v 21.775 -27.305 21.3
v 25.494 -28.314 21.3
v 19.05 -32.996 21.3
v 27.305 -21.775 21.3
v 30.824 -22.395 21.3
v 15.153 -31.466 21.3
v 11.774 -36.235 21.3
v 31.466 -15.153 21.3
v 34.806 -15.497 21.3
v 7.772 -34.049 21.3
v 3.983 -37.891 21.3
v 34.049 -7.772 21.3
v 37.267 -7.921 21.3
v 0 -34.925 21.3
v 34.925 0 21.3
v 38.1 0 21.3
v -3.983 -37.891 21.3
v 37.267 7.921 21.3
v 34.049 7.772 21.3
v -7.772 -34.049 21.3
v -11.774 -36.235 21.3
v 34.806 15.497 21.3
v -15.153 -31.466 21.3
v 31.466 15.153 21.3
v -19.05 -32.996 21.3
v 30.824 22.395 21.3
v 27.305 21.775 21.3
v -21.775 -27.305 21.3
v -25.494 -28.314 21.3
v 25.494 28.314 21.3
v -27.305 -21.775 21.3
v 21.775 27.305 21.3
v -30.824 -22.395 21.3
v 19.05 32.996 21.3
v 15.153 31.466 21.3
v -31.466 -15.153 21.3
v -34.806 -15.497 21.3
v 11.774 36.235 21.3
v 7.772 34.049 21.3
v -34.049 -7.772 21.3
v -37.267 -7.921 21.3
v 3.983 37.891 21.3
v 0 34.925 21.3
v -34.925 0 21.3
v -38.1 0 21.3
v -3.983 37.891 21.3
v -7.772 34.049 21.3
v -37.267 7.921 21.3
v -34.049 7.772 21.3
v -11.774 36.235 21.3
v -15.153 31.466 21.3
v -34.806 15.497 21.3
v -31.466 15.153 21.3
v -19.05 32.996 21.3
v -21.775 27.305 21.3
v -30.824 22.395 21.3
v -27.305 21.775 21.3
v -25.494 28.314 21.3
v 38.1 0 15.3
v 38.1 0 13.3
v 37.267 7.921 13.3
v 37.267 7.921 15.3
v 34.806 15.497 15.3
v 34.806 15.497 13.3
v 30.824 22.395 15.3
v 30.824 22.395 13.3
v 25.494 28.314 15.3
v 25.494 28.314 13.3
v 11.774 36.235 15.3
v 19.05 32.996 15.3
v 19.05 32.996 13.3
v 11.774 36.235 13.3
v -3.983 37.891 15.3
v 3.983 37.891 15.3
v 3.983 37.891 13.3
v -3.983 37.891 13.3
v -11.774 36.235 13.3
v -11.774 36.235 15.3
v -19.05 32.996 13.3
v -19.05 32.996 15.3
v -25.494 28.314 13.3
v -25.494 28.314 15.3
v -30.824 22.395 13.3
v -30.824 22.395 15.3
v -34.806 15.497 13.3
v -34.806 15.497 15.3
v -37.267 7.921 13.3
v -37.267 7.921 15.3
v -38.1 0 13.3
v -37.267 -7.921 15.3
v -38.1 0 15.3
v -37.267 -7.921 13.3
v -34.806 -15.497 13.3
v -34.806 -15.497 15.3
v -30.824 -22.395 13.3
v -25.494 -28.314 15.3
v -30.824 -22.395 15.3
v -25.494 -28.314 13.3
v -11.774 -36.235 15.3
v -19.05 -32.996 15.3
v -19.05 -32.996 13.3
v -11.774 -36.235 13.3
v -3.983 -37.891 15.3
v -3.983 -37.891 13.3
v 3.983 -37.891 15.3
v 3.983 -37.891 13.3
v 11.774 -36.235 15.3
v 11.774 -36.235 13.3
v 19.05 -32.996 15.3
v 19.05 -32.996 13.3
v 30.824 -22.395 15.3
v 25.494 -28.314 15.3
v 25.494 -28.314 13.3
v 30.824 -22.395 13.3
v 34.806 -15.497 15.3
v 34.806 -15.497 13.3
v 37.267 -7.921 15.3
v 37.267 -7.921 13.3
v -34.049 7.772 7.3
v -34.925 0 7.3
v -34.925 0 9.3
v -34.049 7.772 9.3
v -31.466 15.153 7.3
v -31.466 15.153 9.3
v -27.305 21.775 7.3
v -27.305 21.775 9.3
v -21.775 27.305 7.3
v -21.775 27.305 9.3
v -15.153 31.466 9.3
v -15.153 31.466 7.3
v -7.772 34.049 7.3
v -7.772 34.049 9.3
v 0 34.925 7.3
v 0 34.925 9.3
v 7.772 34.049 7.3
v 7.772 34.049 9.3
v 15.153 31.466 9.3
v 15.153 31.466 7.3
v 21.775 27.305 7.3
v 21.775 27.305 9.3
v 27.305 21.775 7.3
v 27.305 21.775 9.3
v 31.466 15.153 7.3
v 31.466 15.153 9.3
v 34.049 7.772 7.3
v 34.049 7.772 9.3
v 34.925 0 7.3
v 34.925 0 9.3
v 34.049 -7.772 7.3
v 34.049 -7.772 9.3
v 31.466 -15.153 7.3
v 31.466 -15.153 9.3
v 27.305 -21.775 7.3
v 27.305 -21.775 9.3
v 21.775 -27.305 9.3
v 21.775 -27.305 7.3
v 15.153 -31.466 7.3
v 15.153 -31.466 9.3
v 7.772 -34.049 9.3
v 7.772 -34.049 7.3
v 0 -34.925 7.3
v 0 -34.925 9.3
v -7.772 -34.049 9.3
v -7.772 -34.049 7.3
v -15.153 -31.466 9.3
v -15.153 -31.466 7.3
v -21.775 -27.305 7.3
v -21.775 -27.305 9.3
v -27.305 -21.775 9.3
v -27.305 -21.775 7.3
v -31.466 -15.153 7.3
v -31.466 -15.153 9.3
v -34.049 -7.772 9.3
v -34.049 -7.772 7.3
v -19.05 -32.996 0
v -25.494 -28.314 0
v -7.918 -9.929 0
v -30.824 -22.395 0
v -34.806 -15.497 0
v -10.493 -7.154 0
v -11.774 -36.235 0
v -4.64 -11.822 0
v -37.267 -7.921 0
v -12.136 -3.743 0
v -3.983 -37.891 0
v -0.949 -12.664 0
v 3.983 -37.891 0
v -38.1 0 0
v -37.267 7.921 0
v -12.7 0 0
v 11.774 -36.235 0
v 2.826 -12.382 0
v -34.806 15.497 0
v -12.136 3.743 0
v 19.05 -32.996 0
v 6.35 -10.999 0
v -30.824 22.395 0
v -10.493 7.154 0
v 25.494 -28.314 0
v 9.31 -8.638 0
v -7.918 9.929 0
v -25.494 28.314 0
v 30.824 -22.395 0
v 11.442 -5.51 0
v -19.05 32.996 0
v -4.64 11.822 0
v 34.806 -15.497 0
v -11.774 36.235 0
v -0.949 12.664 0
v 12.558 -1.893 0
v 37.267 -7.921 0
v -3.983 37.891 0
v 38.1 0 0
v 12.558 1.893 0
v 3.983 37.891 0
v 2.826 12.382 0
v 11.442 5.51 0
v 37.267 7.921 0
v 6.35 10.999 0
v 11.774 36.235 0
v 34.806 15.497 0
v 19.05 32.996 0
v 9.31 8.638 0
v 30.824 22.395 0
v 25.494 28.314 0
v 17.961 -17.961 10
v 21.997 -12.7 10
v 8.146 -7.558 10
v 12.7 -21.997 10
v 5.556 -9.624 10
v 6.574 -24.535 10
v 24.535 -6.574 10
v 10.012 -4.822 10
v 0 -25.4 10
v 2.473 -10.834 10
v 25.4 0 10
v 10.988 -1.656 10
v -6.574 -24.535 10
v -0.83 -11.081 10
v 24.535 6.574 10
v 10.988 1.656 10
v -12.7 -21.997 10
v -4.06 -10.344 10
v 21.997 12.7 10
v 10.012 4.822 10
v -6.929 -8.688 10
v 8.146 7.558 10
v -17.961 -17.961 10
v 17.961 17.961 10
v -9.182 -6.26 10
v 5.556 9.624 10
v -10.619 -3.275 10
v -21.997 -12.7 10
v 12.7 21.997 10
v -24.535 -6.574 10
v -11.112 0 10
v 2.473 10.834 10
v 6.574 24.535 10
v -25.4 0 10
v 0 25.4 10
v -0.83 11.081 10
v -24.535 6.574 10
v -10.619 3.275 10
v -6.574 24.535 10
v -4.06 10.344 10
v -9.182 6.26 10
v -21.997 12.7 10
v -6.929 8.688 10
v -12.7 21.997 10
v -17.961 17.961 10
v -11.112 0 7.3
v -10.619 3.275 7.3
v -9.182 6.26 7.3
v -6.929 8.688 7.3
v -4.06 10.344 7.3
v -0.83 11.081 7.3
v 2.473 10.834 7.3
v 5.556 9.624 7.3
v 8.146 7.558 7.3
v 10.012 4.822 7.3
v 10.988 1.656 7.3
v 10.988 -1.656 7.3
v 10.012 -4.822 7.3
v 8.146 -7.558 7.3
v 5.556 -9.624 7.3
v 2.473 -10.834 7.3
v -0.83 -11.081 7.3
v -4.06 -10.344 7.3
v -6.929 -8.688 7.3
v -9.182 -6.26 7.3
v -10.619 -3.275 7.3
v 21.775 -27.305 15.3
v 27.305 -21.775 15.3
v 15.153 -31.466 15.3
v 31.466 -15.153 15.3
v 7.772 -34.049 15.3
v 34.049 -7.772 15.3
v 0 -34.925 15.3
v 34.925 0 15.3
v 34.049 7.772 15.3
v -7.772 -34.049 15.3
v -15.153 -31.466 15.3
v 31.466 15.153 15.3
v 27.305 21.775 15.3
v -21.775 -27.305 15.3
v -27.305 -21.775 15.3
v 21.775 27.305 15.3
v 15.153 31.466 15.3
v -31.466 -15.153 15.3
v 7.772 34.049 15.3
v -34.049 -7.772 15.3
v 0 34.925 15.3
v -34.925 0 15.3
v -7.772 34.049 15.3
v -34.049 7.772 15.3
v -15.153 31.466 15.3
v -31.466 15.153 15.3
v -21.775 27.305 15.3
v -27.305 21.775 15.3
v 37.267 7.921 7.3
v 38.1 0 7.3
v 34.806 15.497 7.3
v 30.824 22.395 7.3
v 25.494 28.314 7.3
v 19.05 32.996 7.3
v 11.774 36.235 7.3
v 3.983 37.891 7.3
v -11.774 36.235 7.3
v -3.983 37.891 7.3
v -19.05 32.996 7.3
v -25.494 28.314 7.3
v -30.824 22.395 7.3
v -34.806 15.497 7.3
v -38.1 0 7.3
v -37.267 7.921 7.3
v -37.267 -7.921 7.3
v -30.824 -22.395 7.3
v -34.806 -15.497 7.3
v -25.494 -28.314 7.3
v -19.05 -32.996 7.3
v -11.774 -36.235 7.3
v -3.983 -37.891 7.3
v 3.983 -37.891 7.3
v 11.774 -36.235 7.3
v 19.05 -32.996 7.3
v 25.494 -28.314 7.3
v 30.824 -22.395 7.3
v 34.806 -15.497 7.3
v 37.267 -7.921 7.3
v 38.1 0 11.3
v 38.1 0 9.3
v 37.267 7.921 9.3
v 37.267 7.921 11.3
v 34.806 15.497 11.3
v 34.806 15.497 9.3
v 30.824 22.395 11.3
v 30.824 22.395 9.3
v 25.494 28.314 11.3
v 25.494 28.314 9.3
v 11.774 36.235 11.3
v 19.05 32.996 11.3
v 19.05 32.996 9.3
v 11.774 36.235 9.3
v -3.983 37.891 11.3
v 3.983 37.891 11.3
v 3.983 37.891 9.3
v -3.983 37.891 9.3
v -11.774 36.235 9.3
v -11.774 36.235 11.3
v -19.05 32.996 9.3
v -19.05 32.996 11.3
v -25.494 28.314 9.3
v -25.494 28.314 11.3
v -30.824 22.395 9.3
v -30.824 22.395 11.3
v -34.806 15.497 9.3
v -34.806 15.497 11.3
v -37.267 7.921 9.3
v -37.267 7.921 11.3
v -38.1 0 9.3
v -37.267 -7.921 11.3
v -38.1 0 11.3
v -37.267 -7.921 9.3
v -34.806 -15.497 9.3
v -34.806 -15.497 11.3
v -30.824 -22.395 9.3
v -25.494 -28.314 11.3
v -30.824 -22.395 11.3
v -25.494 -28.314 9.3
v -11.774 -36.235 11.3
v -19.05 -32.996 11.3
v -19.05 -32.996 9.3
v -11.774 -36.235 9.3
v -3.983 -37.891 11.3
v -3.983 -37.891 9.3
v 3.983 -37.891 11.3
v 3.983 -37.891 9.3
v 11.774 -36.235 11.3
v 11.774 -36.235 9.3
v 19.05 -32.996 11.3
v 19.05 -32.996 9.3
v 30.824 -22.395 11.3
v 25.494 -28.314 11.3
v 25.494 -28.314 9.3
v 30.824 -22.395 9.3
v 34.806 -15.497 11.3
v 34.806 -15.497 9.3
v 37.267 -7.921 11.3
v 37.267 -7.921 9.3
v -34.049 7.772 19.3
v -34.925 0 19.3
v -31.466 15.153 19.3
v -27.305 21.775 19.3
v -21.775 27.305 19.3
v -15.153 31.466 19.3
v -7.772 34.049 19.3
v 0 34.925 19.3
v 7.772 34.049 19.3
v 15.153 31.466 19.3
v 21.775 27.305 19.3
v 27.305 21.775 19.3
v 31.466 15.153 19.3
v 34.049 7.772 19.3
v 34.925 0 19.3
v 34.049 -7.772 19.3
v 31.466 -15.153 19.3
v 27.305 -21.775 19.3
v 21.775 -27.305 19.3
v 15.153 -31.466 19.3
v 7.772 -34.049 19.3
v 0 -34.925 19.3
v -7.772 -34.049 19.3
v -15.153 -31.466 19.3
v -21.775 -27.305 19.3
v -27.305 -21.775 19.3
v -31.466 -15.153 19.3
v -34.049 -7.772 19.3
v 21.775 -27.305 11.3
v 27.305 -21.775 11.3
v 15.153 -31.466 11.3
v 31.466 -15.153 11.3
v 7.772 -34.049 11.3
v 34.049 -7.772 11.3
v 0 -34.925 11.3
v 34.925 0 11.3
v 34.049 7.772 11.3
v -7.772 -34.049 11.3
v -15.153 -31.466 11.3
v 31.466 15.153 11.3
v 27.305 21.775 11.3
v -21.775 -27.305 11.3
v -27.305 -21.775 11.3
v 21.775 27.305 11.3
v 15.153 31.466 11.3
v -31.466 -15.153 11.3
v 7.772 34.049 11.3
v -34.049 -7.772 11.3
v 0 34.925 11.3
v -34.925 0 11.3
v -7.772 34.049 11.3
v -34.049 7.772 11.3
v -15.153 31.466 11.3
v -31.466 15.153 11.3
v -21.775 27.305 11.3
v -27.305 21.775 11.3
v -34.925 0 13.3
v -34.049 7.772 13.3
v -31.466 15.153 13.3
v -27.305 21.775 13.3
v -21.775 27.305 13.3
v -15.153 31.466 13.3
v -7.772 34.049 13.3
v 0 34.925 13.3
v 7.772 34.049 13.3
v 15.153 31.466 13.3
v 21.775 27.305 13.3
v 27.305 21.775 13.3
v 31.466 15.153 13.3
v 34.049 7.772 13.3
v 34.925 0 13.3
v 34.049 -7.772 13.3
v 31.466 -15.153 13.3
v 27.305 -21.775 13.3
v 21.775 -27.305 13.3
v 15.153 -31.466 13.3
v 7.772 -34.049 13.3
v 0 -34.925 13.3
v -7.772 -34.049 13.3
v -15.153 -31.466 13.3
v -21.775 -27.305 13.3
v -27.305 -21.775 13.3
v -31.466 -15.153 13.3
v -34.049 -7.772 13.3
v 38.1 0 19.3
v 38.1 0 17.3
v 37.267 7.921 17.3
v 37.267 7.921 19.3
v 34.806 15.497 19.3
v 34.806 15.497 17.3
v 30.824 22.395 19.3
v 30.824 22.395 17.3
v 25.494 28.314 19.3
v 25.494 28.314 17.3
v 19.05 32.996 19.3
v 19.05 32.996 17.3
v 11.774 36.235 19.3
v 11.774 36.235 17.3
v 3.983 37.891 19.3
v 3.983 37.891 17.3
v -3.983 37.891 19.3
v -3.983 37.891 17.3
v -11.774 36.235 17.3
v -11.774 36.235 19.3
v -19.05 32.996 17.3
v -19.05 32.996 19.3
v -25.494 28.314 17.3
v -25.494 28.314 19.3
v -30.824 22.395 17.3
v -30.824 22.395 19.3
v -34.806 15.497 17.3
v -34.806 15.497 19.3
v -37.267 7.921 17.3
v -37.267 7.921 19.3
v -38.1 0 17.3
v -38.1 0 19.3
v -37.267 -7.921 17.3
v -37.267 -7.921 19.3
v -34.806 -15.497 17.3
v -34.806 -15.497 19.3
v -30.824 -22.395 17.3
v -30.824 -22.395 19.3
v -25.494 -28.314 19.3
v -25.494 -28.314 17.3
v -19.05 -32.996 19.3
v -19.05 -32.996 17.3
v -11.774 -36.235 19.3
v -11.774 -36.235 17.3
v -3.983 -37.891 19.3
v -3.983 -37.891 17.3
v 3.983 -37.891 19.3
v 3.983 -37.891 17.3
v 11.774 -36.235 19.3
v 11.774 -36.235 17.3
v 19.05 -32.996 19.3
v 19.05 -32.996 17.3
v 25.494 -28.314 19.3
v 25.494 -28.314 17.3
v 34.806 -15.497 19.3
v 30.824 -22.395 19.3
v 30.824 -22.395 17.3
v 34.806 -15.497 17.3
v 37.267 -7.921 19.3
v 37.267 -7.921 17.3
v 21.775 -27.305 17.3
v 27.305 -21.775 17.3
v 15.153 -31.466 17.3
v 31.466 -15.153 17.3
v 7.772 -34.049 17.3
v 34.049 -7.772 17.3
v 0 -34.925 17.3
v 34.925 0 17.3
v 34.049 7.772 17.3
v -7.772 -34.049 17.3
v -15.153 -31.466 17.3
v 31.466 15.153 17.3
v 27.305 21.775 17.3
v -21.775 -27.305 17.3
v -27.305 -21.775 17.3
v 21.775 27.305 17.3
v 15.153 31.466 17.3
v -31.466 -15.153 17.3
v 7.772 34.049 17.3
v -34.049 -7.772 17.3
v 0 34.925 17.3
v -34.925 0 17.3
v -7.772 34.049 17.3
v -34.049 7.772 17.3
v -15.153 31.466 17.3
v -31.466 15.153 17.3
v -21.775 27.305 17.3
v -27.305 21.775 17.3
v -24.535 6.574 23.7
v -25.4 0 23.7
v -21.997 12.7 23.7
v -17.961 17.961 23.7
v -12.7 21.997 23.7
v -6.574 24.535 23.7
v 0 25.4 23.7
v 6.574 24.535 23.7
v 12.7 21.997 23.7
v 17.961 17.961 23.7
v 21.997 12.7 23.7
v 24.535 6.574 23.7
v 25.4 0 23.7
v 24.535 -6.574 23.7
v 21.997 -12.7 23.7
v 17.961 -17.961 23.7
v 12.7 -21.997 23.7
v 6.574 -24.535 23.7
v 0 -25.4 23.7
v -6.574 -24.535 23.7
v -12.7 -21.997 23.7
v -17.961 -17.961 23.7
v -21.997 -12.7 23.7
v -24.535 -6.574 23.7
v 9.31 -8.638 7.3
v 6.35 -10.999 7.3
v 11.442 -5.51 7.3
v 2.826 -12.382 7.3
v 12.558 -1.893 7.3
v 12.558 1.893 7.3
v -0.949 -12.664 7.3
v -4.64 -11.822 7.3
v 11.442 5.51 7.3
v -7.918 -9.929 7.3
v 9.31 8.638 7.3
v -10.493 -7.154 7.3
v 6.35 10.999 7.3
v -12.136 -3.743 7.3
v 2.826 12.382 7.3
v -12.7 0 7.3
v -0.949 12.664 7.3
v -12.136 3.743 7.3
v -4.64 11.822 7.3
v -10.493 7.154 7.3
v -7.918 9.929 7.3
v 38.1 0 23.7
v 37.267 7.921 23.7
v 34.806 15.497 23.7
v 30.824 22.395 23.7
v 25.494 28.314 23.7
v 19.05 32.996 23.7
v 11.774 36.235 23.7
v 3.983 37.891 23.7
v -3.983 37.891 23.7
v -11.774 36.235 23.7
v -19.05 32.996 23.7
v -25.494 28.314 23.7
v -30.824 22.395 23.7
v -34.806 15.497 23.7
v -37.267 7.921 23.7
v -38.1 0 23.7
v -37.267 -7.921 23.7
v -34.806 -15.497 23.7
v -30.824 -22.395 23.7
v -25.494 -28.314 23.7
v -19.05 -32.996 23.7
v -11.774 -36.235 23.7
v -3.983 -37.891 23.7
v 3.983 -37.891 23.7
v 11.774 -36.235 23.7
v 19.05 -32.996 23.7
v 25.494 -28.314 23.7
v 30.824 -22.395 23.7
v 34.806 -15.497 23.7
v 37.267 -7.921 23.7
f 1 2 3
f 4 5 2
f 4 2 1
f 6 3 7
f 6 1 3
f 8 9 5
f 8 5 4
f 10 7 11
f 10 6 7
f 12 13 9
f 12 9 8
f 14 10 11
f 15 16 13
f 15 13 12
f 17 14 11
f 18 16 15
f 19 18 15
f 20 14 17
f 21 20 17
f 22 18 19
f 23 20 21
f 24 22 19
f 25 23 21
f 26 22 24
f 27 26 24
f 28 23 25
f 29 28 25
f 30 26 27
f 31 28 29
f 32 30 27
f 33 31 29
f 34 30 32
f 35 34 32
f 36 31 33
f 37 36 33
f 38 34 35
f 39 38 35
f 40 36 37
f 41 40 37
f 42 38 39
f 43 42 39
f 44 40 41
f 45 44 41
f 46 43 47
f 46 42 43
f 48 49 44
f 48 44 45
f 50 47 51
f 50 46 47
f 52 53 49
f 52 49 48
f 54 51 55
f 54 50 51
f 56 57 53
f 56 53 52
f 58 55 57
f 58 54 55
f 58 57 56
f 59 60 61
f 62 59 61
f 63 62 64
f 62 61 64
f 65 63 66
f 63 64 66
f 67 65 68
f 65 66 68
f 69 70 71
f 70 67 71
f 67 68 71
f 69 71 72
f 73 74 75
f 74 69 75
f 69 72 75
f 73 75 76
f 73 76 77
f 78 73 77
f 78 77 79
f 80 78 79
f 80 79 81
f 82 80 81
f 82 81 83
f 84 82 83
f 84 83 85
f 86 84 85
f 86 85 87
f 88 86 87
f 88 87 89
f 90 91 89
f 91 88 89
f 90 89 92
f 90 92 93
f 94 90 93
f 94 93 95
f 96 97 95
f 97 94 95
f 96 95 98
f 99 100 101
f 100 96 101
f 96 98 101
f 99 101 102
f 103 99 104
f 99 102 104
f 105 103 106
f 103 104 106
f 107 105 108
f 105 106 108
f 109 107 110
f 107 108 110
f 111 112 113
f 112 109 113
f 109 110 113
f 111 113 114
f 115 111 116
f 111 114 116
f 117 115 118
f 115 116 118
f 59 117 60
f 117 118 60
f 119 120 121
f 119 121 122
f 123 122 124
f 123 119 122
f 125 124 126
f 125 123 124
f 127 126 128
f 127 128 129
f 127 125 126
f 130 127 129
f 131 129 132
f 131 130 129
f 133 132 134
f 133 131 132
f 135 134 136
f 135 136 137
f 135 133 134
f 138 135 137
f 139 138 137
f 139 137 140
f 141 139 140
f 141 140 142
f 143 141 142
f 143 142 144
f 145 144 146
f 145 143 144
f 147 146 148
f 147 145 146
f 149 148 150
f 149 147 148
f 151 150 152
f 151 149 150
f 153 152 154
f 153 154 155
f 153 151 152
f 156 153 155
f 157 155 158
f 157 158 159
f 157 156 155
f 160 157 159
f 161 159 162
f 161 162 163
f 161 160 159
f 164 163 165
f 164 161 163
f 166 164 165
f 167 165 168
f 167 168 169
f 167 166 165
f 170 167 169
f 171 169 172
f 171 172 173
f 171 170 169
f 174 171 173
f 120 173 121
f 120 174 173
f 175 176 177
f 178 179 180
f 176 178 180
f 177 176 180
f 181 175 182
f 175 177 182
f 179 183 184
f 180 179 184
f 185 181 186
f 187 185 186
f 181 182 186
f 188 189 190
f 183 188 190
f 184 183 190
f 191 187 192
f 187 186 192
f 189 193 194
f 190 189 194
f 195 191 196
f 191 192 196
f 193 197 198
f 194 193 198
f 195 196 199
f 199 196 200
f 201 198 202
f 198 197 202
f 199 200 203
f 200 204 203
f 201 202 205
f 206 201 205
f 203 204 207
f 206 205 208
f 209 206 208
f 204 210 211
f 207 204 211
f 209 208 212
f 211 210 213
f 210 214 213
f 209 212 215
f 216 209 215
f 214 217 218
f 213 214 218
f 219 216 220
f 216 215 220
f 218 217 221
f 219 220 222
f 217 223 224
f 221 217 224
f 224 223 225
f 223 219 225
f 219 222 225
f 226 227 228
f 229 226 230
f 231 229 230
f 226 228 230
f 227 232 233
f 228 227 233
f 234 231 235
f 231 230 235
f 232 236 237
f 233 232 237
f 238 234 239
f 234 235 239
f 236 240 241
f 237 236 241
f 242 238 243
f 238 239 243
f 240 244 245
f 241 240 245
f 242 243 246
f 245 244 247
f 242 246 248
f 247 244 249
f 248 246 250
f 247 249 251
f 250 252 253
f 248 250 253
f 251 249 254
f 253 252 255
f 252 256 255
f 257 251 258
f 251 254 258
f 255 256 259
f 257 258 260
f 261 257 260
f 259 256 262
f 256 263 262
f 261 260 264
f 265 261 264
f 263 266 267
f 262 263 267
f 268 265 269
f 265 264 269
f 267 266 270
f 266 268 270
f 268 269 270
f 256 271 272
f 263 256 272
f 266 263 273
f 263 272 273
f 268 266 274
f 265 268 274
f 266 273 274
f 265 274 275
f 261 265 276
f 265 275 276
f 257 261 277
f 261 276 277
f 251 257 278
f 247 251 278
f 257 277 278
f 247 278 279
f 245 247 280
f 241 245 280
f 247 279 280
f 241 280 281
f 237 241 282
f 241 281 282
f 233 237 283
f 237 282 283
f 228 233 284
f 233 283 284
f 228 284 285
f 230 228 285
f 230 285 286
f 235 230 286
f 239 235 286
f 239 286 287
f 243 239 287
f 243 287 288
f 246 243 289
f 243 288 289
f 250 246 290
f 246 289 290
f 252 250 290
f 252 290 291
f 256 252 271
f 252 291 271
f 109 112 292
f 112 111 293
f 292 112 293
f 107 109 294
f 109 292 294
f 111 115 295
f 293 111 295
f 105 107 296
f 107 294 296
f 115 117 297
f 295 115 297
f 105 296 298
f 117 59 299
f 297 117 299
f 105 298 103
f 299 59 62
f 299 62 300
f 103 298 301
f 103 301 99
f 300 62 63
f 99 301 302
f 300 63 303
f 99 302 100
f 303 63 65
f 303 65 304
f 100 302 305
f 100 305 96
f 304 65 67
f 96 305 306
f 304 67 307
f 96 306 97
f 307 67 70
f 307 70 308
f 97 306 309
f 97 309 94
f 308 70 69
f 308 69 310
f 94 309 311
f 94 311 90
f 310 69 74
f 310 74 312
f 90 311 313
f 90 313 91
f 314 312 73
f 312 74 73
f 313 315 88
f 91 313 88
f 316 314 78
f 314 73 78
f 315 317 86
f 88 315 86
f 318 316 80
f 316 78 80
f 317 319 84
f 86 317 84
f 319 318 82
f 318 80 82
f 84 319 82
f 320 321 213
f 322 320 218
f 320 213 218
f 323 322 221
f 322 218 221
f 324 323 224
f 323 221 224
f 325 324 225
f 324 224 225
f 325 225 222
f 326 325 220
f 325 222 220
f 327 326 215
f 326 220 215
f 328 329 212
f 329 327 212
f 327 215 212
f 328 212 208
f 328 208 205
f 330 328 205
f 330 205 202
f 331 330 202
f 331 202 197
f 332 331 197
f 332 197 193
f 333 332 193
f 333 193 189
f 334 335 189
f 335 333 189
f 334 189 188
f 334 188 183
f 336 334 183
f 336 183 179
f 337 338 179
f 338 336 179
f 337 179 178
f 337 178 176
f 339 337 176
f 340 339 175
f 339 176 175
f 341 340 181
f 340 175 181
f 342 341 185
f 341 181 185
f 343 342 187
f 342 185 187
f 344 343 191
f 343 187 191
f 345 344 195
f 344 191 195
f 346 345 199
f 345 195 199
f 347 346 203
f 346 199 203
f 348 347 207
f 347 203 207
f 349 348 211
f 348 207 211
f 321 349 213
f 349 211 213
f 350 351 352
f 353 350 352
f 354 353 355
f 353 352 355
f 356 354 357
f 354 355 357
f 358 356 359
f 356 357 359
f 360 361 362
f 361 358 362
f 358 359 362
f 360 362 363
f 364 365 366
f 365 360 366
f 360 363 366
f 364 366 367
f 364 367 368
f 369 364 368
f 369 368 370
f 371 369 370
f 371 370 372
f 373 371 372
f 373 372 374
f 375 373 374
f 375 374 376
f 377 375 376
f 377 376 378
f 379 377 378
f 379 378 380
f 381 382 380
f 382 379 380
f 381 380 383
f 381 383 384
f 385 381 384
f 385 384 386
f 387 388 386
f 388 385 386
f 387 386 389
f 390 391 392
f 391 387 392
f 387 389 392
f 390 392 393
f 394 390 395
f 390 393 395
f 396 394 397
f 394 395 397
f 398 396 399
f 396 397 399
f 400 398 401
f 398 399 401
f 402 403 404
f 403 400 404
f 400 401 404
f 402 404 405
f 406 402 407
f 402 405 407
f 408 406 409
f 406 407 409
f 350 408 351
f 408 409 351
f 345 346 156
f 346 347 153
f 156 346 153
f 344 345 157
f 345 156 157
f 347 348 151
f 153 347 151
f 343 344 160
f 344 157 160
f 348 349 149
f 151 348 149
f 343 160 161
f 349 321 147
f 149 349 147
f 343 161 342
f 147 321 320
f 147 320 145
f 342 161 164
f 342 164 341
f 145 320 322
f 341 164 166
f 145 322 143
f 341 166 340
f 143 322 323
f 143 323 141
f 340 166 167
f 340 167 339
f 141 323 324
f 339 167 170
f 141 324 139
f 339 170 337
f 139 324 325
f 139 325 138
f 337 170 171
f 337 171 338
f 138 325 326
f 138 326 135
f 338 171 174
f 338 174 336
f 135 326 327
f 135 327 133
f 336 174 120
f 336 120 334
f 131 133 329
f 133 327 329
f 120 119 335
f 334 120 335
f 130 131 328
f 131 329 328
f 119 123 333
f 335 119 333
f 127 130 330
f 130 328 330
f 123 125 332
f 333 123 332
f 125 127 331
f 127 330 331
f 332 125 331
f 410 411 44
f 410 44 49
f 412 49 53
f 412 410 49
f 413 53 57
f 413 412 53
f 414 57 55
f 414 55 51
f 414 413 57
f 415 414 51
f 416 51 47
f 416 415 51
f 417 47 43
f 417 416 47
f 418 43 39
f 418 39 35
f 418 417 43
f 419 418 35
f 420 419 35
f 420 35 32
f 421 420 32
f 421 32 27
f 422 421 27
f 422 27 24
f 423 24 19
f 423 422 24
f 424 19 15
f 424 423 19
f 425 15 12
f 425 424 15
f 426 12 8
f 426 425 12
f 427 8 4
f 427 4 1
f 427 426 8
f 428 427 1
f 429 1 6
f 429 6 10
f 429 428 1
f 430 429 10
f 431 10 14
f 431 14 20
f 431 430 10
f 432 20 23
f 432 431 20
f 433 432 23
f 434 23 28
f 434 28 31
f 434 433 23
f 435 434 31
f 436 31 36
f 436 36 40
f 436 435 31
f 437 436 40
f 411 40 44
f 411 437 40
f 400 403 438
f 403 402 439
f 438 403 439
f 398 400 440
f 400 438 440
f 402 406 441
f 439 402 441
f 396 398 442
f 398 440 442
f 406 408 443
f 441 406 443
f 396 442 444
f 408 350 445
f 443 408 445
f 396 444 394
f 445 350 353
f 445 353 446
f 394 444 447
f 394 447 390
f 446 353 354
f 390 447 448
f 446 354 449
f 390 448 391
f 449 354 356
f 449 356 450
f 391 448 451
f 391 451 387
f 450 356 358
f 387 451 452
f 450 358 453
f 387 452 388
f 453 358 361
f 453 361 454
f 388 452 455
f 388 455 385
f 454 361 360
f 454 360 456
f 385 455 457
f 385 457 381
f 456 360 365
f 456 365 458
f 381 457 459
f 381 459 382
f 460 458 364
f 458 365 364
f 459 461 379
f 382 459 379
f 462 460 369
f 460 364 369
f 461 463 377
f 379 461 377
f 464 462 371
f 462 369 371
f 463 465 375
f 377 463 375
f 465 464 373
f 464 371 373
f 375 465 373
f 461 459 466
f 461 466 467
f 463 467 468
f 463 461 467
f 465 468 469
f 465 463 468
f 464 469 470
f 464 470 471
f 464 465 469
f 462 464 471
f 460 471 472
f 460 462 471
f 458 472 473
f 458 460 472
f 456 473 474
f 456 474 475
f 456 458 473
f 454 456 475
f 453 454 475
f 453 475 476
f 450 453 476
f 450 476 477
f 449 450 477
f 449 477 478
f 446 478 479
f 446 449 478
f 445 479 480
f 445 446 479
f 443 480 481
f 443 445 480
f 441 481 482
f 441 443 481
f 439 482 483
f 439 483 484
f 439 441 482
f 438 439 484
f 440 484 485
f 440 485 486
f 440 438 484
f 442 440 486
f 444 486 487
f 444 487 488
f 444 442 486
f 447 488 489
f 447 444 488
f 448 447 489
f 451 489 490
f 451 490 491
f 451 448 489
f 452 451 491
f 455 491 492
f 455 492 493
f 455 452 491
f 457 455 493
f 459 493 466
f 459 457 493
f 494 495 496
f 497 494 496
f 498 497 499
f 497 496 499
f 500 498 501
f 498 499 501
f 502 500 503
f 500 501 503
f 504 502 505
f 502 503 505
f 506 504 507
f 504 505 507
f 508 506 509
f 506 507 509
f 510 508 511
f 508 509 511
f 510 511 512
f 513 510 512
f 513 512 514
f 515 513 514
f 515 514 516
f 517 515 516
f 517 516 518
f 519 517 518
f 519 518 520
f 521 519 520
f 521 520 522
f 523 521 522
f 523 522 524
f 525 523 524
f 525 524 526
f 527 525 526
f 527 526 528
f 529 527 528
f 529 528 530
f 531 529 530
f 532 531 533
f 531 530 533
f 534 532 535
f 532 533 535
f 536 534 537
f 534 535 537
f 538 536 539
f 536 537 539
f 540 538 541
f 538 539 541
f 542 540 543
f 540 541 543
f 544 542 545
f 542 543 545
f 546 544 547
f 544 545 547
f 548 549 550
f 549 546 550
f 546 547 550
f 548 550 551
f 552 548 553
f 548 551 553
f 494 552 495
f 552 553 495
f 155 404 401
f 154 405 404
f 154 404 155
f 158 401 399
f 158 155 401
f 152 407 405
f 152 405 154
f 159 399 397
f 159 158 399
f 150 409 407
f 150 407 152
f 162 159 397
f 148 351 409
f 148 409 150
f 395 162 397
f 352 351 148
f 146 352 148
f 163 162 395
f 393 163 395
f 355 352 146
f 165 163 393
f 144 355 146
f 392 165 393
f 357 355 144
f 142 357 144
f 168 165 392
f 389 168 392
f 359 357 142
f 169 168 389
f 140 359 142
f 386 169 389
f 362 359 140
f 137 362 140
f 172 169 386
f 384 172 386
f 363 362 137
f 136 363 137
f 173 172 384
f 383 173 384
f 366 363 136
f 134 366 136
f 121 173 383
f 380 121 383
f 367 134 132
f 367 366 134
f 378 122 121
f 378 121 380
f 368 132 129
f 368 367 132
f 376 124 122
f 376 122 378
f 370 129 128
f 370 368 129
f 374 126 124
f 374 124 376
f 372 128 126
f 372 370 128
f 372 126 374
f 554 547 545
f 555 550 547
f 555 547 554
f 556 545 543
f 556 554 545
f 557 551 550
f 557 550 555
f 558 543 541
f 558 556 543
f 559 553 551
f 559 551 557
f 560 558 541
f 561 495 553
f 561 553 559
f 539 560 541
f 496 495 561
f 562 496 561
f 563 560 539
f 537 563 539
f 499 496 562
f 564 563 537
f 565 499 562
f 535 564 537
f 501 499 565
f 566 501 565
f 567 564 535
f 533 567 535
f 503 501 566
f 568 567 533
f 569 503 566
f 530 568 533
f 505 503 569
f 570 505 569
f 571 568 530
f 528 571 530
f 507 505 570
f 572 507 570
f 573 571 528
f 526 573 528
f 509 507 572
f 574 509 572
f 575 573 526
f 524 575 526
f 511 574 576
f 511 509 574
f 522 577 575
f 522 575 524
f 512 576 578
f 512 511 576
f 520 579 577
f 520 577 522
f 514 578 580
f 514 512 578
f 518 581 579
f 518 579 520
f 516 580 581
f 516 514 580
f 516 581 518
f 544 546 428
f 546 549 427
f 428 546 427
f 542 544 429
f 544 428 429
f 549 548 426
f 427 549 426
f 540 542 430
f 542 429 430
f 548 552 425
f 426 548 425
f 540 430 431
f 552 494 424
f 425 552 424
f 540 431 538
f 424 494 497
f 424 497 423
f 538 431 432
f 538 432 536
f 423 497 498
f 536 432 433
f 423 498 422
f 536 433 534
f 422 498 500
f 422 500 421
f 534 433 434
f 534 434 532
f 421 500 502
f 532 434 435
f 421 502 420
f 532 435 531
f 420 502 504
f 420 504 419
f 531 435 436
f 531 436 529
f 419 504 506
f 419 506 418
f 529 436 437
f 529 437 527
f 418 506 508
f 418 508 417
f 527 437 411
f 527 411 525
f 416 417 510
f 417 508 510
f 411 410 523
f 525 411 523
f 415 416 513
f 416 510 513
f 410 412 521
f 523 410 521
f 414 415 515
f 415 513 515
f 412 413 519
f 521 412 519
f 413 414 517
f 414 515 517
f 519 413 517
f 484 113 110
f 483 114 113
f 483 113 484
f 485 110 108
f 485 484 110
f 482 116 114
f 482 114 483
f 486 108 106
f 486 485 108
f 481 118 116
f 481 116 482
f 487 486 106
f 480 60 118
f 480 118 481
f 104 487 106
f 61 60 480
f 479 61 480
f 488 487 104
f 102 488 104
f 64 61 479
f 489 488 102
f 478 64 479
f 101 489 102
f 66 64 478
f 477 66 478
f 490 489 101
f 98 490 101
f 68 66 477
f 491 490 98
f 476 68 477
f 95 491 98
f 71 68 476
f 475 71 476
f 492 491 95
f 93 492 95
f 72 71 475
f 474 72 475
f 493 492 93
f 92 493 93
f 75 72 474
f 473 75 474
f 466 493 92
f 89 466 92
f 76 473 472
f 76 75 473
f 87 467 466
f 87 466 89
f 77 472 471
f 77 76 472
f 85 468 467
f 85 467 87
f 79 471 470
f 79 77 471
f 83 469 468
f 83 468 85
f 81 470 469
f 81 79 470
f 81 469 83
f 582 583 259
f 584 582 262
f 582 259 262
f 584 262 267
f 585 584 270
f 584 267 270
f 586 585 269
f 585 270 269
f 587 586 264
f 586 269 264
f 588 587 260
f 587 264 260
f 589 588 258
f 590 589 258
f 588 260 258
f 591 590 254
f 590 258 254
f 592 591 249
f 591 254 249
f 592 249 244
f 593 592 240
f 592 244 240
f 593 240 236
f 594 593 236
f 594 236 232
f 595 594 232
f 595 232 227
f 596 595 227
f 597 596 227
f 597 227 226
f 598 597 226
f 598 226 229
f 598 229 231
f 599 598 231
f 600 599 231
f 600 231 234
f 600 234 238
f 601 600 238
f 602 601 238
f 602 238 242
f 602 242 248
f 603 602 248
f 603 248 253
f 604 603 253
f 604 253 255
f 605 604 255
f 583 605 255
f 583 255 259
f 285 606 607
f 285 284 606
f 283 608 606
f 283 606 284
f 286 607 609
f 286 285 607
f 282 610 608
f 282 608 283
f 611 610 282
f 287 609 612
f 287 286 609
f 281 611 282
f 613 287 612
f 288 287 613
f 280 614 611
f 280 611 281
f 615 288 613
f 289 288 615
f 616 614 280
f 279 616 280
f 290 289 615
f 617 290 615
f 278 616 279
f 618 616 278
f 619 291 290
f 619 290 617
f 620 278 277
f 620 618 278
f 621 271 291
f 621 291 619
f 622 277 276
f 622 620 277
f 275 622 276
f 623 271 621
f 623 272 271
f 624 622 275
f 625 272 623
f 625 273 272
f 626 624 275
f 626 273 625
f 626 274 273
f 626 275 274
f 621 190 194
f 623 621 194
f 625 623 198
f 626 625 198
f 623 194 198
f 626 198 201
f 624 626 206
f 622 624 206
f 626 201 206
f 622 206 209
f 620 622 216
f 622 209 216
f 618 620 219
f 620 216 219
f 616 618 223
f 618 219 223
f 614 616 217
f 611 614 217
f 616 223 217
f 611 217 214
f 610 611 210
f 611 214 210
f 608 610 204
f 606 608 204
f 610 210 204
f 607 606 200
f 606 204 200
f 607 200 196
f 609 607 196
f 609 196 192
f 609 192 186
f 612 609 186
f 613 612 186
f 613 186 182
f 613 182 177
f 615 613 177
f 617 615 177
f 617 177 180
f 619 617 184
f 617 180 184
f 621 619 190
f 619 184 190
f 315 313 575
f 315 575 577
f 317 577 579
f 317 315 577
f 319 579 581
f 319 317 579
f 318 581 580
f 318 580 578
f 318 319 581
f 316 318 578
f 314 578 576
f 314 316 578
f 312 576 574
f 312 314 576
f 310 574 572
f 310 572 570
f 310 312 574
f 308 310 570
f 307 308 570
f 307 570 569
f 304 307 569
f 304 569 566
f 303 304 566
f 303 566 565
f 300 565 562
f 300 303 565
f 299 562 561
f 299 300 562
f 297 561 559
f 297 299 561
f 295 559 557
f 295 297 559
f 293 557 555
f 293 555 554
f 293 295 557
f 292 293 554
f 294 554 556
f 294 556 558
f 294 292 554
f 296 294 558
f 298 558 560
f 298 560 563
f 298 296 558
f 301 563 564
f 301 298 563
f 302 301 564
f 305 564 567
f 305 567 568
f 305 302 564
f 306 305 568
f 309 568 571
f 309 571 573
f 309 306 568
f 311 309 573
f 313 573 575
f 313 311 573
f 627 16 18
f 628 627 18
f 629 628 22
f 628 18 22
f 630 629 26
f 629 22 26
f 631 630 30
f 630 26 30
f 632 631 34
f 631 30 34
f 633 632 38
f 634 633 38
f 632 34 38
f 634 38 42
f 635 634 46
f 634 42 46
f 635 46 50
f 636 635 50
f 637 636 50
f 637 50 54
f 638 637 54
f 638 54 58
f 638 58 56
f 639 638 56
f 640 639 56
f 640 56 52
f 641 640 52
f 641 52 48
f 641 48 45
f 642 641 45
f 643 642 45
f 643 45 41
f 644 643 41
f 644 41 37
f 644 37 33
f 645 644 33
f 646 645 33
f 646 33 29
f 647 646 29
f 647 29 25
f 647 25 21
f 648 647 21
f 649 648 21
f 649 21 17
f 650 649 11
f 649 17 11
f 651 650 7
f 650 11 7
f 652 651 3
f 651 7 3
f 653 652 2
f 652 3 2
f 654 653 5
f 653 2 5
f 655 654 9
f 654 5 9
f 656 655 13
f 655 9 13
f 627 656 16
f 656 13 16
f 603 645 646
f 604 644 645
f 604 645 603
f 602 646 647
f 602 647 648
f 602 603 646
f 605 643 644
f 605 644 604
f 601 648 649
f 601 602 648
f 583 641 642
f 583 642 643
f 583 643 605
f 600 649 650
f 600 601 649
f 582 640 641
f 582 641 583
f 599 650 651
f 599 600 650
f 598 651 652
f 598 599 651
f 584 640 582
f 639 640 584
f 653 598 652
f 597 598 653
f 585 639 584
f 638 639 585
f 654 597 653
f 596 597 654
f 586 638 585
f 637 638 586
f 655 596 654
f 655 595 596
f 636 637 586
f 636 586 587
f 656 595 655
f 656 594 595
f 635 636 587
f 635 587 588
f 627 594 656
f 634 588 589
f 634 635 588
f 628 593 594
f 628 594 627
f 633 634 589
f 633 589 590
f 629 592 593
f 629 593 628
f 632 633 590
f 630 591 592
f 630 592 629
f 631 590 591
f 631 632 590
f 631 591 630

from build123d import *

# Parameters (mm, degrees)
ESQUISSE1_R                = 38.1
BOSS_EXTRU_1_DEPTH         = 23.7
ESQUISSE2_R                = 12.7
ENL_V_MAT_EXTRU_1_DEPTH    = 7.3
ESQUISSE3_R                = 11.1125
ENL_V_MAT_EXTRU_2_DEPTH    = 2.7
ESQUISSE4_R                = 25.4
ENL_V_MAT_EXTRU_3_DEPTH    = 56.59595309
ESQUISSE6_OUTSIDE_W        = 100.268
ESQUISSE6_OUTSIDE_H        = 100.268
ESQUISSE6_OUTSIDE_R        = 34.925
ENL_V_MAT_EXTRU_4_DEPTH    = 2
R_P_TITION_LIN_AIRE1_COUNT = 4
R_P_TITION_LIN_AIRE1_PITCH = 4


with BuildPart() as part:
    # Esquisse1 → Boss.-Extru.1 (new body)
    with BuildSketch(Plane.XY):
        Circle(ESQUISSE1_R)
    extrude(amount=BOSS_EXTRU_1_DEPTH)

    # Esquisse2 → Enlèv. mat.-Extru.1 (cut)
    with BuildSketch(Plane(origin=(0, 0, 0), x_dir=(-1, 0, 0), z_dir=(0, 0, -1))):
        Circle(ESQUISSE2_R)
    extrude(amount=-ENL_V_MAT_EXTRU_1_DEPTH, mode=Mode.SUBTRACT)

    # Esquisse3 → Enlèv. mat.-Extru.2 (cut)
    with BuildSketch(Plane(origin=(0, 0, 7.3), x_dir=(-1, 0, 0), z_dir=(0, 0, -1))):
        Circle(ESQUISSE3_R)
    extrude(amount=-ENL_V_MAT_EXTRU_2_DEPTH, mode=Mode.SUBTRACT)

    # Esquisse4 → Enlèv. mat.-Extru.3 (cut, through all)
    with BuildSketch(Plane(origin=(0, 0, 10), x_dir=(-1, 0, 0), z_dir=(0, 0, -1))):
        Circle(ESQUISSE4_R)
    extrude(amount=-ENL_V_MAT_EXTRU_3_DEPTH, mode=Mode.SUBTRACT)

    # Esquisse6 outside → Enlèv. mat.-Extru.4 (cut)
    with BuildSketch(Plane(origin=(0, 0, 7.3), x_dir=(-1, 0, 0), z_dir=(0, 0, -1))):
        Rectangle(ESQUISSE6_OUTSIDE_W, ESQUISSE6_OUTSIDE_H)
        Circle(ESQUISSE6_OUTSIDE_R, mode=Mode.SUBTRACT)
    enl_v_mat_extru_4 = extrude(amount=-ENL_V_MAT_EXTRU_4_DEPTH, mode=Mode.SUBTRACT)

    # Répétition linéaire1: Enlèv. mat.-Extru.4 ×4
    with Locations(*[(0, 0, i * R_P_TITION_LIN_AIRE1_PITCH) for i in range(1, R_P_TITION_LIN_AIRE1_COUNT)]):
        add(enl_v_mat_extru_4, mode=Mode.SUBTRACT)


solid = part.part
